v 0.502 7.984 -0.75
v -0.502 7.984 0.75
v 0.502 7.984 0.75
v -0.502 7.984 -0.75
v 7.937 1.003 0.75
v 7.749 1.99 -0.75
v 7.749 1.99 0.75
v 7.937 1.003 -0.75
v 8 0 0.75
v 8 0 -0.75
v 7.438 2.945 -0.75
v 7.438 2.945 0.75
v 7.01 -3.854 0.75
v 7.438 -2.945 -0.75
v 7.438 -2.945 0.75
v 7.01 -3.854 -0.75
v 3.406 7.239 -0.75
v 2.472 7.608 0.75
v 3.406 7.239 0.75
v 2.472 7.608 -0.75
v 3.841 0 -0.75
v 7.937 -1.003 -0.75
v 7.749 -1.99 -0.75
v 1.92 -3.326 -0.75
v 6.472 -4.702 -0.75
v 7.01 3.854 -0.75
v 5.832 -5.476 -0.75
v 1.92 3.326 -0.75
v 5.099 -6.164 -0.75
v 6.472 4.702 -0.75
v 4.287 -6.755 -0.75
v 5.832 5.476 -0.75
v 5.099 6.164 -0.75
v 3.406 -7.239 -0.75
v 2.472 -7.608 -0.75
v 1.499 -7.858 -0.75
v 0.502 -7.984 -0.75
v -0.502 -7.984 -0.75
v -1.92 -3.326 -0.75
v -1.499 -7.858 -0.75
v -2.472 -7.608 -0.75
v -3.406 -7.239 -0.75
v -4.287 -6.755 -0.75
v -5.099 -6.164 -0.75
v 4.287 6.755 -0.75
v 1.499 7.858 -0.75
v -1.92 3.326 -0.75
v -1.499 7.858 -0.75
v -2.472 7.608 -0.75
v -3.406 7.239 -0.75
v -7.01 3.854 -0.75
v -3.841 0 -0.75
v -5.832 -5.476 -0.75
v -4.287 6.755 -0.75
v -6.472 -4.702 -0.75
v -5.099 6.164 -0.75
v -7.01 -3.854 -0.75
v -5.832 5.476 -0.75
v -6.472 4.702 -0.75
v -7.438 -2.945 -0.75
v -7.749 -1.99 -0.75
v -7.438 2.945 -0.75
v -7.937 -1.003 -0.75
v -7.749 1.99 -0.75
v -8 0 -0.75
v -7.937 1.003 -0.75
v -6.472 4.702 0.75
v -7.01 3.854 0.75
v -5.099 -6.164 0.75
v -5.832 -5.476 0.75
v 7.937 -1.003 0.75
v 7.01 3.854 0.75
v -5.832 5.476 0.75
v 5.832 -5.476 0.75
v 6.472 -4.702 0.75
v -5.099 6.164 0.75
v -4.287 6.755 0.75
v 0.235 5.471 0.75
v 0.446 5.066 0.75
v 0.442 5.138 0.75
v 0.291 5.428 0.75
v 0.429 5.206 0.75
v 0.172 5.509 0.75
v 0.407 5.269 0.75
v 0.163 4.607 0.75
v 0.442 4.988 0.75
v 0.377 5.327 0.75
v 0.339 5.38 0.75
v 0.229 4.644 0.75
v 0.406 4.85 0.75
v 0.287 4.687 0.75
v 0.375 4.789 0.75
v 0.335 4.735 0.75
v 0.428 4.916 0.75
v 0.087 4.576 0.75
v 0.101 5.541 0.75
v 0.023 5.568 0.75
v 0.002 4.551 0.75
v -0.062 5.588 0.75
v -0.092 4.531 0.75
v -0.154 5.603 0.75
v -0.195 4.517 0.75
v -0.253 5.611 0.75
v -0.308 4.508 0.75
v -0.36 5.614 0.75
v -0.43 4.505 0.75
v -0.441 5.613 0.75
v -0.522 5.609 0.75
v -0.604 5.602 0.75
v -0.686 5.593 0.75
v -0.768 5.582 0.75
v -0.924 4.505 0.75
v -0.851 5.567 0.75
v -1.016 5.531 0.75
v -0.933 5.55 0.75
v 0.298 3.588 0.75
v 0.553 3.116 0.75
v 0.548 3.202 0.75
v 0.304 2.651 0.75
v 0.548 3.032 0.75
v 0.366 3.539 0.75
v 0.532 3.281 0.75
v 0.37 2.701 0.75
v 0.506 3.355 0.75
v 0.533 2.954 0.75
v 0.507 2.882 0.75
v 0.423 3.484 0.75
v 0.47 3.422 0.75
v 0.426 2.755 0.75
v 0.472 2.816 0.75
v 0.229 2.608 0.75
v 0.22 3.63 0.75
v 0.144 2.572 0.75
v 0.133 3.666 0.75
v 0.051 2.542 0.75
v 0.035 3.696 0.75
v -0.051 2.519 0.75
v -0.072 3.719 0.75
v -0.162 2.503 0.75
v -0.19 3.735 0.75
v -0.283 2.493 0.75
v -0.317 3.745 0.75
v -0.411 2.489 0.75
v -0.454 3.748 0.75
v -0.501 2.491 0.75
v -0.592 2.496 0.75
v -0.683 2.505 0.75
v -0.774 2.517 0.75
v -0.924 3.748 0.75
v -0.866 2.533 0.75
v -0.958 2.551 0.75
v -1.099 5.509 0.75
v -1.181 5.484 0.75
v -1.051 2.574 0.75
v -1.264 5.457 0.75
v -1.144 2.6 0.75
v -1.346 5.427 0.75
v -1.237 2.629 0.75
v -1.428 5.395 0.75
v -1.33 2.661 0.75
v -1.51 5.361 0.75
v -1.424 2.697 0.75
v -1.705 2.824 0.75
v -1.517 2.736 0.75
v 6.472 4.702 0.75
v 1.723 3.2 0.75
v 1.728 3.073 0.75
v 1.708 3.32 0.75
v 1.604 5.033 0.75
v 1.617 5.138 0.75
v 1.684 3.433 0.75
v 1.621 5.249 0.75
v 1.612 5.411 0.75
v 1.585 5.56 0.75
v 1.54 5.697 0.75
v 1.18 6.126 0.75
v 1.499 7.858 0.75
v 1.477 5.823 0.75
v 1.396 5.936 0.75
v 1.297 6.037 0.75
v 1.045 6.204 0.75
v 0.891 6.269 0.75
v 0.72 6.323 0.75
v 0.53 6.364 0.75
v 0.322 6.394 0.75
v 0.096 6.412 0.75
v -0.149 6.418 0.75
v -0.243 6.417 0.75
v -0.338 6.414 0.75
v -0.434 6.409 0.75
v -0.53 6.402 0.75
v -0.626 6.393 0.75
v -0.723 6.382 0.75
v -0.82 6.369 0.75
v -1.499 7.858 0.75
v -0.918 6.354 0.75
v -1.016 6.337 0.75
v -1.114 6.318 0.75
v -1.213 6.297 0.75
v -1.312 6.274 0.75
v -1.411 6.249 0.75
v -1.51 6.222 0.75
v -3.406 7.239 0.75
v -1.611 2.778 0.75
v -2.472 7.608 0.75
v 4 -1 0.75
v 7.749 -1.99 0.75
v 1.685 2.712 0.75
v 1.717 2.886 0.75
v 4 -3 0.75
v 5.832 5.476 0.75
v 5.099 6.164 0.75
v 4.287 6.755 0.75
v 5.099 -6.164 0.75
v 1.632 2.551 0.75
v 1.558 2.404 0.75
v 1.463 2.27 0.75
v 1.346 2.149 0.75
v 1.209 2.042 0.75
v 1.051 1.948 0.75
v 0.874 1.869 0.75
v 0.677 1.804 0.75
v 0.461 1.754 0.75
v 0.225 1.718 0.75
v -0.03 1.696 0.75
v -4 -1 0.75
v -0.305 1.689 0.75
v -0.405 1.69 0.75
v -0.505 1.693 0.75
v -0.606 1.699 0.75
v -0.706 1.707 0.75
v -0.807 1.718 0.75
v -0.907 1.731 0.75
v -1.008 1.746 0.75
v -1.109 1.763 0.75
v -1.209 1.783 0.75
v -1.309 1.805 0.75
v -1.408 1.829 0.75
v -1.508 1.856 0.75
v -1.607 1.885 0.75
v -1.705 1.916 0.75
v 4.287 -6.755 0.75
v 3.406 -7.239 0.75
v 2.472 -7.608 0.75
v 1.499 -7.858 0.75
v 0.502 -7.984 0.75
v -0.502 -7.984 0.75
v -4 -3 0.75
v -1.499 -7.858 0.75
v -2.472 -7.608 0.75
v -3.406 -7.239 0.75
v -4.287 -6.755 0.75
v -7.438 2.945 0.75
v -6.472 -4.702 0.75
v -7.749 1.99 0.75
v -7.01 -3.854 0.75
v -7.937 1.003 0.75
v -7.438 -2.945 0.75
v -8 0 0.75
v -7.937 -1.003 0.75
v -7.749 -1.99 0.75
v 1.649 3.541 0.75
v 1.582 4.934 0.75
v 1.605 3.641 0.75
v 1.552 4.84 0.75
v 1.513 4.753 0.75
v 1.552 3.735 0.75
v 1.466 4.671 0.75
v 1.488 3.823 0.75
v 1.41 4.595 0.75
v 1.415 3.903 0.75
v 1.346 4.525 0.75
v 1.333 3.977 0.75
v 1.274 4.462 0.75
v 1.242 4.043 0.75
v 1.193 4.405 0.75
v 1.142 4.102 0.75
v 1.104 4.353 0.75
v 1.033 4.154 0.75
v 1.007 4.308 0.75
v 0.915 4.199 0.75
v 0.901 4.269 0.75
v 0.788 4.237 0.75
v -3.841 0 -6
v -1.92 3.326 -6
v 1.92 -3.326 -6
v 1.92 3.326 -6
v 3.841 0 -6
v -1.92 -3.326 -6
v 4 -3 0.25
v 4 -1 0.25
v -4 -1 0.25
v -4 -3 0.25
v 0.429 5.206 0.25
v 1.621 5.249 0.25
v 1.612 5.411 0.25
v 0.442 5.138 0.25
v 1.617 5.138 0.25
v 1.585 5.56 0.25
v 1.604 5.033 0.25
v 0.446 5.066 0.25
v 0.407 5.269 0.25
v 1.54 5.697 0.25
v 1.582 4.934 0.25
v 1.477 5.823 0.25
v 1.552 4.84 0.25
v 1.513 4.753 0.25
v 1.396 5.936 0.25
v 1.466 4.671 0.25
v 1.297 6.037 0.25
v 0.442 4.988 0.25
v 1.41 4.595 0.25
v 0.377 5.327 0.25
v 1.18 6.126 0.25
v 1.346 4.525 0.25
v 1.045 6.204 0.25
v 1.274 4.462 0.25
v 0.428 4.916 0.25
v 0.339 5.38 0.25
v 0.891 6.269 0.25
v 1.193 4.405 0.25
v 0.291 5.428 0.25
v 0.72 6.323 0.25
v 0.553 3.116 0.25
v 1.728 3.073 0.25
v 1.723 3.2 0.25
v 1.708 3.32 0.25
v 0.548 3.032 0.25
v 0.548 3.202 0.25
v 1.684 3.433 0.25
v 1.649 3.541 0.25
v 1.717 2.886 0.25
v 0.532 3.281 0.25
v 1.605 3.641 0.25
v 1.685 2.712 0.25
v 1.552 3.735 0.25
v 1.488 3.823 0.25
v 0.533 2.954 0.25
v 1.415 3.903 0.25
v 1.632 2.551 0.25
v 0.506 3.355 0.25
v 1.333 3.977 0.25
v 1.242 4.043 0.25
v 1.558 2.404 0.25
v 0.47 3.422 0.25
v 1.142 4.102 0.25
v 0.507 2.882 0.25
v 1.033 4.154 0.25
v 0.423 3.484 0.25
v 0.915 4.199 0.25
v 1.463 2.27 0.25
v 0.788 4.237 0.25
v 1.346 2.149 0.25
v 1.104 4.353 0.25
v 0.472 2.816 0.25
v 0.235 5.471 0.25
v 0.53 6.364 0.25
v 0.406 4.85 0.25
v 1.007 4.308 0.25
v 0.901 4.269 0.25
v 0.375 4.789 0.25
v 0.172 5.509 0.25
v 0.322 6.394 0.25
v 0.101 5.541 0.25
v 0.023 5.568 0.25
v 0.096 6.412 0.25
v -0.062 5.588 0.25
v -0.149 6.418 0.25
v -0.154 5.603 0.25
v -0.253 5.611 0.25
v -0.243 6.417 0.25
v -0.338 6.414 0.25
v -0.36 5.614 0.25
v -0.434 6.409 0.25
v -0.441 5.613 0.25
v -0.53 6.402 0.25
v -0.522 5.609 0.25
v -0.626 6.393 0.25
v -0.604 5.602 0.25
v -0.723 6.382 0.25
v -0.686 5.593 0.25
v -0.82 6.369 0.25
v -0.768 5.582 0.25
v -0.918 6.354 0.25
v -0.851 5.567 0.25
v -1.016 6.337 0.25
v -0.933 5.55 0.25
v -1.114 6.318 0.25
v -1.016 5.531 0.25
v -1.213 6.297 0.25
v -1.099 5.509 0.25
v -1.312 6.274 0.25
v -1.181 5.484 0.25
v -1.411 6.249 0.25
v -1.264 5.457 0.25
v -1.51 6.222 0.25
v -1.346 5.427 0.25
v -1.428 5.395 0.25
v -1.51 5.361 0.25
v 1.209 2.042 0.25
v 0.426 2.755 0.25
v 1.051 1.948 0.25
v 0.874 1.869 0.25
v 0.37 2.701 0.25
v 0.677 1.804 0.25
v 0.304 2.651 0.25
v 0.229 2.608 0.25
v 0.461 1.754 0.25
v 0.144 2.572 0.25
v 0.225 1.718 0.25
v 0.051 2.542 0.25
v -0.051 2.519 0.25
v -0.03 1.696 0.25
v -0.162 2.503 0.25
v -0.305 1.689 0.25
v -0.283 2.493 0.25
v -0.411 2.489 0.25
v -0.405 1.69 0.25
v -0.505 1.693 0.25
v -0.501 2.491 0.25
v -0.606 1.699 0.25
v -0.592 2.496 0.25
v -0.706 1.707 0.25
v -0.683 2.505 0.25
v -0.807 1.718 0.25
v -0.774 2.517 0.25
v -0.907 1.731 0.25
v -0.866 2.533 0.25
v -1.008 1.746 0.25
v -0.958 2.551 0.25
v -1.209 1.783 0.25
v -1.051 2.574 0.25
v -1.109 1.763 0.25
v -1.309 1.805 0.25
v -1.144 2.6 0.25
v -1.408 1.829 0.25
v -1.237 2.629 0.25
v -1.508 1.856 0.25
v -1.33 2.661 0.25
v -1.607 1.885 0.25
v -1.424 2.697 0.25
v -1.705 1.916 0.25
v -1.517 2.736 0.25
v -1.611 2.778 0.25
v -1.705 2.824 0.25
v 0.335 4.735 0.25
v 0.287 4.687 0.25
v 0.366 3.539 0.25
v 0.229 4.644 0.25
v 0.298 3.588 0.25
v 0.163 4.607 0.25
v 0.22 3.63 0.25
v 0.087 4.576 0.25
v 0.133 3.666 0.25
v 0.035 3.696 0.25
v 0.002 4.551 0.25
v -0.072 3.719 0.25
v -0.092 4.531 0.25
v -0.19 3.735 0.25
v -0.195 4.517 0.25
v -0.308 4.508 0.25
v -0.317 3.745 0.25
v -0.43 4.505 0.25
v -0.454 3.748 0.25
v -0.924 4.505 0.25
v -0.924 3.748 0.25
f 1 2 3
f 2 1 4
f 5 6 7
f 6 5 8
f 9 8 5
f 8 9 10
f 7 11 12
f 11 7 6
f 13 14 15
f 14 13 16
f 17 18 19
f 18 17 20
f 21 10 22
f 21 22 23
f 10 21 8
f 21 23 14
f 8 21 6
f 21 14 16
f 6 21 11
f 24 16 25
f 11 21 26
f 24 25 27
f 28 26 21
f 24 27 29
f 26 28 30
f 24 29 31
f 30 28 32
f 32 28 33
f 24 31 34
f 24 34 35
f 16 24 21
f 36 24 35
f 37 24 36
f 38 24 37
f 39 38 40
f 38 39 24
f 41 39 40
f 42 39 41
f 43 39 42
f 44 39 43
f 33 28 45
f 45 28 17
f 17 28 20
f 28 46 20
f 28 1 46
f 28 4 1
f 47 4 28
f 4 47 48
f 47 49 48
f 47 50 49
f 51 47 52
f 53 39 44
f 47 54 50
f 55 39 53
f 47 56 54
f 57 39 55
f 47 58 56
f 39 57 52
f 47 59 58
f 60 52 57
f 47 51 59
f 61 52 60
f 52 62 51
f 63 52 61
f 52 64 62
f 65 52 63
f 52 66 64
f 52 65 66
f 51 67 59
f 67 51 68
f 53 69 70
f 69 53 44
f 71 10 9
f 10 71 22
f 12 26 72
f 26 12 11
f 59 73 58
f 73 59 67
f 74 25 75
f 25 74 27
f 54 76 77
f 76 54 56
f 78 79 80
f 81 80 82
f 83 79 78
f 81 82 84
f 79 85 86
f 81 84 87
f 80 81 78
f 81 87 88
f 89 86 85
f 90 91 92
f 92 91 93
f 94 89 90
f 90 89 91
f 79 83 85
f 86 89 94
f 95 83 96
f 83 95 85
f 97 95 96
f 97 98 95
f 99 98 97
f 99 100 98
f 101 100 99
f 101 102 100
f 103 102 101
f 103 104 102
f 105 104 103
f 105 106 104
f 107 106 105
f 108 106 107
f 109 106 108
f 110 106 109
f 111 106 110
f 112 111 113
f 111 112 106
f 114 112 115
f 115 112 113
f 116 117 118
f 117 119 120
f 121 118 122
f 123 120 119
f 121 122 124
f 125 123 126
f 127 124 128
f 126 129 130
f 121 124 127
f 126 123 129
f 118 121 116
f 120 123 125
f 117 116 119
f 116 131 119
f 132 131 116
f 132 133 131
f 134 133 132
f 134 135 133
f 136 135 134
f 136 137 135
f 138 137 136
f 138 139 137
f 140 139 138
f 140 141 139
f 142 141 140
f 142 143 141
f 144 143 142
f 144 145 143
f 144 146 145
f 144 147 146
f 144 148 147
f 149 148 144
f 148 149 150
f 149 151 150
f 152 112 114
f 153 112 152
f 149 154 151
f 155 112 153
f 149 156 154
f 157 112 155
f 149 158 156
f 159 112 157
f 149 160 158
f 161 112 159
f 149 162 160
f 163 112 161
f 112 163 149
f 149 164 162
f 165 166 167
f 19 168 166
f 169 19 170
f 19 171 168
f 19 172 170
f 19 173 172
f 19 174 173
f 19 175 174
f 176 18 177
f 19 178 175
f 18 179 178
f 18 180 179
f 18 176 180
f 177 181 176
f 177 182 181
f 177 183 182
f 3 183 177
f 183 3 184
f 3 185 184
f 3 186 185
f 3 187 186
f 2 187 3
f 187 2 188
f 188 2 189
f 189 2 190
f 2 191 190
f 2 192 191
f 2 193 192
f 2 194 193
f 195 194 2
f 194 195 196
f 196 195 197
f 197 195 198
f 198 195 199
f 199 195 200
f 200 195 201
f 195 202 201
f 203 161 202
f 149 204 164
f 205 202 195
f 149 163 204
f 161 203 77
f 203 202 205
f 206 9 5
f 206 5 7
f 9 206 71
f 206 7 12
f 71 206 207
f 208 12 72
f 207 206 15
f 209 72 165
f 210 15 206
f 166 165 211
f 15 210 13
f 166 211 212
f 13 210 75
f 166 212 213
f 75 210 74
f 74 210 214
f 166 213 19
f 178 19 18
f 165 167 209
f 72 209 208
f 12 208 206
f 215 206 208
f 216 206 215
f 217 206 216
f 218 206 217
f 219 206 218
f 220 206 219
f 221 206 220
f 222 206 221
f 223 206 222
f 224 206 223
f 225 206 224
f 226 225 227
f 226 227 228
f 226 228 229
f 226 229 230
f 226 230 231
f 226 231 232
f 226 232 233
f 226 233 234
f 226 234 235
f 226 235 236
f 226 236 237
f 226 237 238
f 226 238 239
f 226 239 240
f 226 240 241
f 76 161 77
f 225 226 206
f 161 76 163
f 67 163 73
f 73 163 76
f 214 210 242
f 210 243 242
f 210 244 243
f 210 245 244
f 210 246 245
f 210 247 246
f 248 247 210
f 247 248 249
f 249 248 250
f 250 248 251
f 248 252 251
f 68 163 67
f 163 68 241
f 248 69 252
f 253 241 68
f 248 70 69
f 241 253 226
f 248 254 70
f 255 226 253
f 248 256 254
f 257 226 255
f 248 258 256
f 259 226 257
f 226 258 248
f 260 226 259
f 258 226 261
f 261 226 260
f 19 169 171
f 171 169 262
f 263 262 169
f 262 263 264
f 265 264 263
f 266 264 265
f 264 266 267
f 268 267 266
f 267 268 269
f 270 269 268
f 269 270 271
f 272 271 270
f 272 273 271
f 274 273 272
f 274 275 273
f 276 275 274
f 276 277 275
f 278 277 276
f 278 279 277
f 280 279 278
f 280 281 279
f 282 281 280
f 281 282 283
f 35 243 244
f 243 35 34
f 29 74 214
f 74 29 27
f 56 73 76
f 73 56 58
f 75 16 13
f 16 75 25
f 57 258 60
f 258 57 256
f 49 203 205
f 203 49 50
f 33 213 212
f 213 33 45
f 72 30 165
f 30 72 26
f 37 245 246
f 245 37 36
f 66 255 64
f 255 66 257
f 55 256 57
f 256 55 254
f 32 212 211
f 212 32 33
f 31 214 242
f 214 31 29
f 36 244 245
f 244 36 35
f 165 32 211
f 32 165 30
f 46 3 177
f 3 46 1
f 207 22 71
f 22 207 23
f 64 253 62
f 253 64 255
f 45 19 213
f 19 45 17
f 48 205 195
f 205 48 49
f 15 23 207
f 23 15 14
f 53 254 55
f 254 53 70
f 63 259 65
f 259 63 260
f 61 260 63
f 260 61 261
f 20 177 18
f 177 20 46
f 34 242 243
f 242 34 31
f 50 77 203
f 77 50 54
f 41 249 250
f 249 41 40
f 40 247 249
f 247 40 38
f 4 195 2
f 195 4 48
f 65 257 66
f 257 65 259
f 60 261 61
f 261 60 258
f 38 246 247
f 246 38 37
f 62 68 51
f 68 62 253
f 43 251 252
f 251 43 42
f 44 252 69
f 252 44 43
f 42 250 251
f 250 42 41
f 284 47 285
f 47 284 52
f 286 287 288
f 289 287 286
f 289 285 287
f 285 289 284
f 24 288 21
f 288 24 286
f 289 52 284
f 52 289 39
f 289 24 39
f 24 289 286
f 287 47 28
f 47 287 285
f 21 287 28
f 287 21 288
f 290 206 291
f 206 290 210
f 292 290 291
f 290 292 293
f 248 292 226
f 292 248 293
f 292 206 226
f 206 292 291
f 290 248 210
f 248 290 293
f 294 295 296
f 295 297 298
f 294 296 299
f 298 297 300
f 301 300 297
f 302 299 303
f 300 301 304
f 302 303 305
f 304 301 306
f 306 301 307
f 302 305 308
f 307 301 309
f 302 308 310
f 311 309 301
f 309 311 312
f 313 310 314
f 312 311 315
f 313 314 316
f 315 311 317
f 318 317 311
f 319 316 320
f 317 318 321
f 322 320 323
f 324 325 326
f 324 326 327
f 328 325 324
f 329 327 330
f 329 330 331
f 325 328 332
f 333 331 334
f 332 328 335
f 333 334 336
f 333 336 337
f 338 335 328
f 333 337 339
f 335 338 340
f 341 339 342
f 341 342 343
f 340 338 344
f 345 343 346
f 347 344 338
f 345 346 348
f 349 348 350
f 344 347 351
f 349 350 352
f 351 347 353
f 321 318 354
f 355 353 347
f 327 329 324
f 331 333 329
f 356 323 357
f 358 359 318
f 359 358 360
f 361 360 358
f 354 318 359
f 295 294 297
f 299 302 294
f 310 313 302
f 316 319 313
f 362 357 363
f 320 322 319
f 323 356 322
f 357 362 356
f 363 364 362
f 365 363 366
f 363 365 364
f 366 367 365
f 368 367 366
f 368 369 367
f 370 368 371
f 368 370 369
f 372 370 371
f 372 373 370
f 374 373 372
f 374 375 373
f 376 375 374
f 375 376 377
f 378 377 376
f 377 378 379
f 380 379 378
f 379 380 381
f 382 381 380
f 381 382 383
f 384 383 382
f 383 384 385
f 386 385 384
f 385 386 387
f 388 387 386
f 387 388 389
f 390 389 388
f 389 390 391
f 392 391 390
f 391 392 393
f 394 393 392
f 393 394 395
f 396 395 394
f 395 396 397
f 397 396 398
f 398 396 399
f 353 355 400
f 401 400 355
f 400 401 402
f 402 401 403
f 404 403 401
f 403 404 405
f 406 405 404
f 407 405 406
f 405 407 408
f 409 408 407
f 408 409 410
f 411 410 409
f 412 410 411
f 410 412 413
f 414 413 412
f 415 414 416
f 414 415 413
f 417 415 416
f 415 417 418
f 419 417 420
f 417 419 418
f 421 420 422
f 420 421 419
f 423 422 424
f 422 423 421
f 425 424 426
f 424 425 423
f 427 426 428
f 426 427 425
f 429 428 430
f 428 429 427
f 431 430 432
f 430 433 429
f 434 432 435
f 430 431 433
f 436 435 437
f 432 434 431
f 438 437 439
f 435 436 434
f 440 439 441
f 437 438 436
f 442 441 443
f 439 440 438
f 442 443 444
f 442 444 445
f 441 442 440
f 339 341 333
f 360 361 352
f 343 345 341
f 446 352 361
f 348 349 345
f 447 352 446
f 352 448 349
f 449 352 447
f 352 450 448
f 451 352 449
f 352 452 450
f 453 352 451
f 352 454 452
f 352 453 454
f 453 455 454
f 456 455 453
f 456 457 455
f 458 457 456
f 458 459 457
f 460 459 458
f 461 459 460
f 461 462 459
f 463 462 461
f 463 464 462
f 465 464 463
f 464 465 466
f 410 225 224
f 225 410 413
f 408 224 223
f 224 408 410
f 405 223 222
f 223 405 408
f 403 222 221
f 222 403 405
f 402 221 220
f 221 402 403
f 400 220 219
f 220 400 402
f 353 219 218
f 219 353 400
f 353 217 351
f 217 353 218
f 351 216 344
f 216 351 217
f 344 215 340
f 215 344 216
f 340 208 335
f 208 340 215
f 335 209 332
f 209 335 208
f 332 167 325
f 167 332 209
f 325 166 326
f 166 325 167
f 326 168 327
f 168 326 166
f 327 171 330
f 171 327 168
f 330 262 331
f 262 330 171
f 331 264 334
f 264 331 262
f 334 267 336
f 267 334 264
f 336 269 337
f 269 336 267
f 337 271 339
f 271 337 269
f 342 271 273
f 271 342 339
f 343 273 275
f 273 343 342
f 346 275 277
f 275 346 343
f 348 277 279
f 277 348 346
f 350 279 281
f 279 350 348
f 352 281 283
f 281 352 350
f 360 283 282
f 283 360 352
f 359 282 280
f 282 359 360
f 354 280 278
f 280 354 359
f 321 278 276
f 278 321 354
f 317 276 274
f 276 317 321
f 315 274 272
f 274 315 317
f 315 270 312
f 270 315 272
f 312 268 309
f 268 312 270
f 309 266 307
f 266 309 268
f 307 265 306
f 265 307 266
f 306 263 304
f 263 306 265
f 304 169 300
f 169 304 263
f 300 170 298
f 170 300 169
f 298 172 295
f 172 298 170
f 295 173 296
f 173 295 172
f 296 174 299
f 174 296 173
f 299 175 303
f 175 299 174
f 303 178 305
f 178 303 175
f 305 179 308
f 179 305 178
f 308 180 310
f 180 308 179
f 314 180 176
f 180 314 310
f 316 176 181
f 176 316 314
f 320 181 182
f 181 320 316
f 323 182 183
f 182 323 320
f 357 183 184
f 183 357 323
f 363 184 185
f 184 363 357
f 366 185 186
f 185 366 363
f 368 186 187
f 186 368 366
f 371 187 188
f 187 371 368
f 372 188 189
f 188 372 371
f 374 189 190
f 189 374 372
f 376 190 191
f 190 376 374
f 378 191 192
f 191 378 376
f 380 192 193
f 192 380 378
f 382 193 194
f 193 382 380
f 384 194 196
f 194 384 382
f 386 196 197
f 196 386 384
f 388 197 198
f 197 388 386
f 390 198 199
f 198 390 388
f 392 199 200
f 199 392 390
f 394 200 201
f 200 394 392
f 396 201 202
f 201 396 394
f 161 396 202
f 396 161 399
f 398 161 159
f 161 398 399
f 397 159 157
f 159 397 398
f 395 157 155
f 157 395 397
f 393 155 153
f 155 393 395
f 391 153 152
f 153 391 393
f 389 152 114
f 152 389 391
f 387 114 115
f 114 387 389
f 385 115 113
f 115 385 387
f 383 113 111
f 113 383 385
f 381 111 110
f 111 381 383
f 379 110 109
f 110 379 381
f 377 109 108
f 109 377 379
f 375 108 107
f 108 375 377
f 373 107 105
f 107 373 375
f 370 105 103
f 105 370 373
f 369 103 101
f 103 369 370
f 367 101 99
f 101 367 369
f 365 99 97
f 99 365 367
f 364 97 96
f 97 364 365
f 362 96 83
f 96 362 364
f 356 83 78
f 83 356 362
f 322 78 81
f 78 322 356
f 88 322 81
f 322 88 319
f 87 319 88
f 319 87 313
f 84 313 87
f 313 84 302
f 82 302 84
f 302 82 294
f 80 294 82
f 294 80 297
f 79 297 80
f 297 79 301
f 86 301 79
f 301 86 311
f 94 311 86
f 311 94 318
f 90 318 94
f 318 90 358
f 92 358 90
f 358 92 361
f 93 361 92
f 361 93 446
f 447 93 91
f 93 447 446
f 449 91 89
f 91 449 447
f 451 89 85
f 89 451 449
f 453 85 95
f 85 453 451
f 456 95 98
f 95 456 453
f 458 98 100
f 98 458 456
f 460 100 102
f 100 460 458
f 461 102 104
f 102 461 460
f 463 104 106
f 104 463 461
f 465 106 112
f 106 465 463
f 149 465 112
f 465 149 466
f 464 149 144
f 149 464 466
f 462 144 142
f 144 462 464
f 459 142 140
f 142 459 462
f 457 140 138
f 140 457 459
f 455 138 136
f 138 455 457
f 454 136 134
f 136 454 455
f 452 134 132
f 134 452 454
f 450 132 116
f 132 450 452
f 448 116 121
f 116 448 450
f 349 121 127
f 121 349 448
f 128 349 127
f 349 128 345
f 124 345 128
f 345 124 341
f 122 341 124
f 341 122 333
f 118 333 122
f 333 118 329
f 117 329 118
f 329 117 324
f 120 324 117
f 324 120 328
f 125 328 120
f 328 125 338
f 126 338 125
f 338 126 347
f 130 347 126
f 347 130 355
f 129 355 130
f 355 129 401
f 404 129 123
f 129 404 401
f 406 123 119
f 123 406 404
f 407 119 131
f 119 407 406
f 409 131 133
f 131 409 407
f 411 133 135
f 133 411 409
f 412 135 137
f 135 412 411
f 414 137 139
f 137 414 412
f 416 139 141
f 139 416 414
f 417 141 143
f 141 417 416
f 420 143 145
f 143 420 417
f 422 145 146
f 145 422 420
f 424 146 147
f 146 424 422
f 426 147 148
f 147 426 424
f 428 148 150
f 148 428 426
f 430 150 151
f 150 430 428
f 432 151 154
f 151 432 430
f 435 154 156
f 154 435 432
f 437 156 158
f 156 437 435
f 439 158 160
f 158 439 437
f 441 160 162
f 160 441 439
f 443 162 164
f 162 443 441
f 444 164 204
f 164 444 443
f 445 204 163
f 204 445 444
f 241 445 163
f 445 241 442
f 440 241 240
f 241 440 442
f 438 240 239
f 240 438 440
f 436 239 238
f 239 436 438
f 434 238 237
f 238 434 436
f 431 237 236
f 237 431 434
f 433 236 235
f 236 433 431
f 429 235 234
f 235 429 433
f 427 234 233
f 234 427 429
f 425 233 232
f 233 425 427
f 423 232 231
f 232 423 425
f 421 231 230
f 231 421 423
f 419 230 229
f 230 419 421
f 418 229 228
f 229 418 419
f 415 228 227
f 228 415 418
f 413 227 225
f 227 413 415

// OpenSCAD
$fn = 50;


difference() {
	union() {
		translate(v = [0, 0, -0.7500000000]) {
			cylinder(h = 1.5000000000, r = 8.0000000000);
		}
		translate(v = [0, 0, -6]) {
			linear_extrude(height = 6) {
				polygon(points = [[3.8408550000, 0.0000000000], [1.9204275000, 3.3262780023], [-1.9204275000, 3.3262780023], [-3.8408550000, 0.0000000000], [-1.9204275000, -3.3262780023], [1.9204275000, -3.3262780023]]);
			}
		}
	}
	union() {
		#translate(v = [-4.0000000000, -3.0000000000, 0.2500000000]) {
			cube(size = [8, 2, 0.5000000000]);
		}
		#translate(v = [0, 4, 0.2500000000]) {
			linear_extrude(height = 0.5000000000) {
				text(font = "SegoiUI:Bold", halign = "center", size = 4.5000000000, text = "3", valign = "center");
			}
		}
	}
}
